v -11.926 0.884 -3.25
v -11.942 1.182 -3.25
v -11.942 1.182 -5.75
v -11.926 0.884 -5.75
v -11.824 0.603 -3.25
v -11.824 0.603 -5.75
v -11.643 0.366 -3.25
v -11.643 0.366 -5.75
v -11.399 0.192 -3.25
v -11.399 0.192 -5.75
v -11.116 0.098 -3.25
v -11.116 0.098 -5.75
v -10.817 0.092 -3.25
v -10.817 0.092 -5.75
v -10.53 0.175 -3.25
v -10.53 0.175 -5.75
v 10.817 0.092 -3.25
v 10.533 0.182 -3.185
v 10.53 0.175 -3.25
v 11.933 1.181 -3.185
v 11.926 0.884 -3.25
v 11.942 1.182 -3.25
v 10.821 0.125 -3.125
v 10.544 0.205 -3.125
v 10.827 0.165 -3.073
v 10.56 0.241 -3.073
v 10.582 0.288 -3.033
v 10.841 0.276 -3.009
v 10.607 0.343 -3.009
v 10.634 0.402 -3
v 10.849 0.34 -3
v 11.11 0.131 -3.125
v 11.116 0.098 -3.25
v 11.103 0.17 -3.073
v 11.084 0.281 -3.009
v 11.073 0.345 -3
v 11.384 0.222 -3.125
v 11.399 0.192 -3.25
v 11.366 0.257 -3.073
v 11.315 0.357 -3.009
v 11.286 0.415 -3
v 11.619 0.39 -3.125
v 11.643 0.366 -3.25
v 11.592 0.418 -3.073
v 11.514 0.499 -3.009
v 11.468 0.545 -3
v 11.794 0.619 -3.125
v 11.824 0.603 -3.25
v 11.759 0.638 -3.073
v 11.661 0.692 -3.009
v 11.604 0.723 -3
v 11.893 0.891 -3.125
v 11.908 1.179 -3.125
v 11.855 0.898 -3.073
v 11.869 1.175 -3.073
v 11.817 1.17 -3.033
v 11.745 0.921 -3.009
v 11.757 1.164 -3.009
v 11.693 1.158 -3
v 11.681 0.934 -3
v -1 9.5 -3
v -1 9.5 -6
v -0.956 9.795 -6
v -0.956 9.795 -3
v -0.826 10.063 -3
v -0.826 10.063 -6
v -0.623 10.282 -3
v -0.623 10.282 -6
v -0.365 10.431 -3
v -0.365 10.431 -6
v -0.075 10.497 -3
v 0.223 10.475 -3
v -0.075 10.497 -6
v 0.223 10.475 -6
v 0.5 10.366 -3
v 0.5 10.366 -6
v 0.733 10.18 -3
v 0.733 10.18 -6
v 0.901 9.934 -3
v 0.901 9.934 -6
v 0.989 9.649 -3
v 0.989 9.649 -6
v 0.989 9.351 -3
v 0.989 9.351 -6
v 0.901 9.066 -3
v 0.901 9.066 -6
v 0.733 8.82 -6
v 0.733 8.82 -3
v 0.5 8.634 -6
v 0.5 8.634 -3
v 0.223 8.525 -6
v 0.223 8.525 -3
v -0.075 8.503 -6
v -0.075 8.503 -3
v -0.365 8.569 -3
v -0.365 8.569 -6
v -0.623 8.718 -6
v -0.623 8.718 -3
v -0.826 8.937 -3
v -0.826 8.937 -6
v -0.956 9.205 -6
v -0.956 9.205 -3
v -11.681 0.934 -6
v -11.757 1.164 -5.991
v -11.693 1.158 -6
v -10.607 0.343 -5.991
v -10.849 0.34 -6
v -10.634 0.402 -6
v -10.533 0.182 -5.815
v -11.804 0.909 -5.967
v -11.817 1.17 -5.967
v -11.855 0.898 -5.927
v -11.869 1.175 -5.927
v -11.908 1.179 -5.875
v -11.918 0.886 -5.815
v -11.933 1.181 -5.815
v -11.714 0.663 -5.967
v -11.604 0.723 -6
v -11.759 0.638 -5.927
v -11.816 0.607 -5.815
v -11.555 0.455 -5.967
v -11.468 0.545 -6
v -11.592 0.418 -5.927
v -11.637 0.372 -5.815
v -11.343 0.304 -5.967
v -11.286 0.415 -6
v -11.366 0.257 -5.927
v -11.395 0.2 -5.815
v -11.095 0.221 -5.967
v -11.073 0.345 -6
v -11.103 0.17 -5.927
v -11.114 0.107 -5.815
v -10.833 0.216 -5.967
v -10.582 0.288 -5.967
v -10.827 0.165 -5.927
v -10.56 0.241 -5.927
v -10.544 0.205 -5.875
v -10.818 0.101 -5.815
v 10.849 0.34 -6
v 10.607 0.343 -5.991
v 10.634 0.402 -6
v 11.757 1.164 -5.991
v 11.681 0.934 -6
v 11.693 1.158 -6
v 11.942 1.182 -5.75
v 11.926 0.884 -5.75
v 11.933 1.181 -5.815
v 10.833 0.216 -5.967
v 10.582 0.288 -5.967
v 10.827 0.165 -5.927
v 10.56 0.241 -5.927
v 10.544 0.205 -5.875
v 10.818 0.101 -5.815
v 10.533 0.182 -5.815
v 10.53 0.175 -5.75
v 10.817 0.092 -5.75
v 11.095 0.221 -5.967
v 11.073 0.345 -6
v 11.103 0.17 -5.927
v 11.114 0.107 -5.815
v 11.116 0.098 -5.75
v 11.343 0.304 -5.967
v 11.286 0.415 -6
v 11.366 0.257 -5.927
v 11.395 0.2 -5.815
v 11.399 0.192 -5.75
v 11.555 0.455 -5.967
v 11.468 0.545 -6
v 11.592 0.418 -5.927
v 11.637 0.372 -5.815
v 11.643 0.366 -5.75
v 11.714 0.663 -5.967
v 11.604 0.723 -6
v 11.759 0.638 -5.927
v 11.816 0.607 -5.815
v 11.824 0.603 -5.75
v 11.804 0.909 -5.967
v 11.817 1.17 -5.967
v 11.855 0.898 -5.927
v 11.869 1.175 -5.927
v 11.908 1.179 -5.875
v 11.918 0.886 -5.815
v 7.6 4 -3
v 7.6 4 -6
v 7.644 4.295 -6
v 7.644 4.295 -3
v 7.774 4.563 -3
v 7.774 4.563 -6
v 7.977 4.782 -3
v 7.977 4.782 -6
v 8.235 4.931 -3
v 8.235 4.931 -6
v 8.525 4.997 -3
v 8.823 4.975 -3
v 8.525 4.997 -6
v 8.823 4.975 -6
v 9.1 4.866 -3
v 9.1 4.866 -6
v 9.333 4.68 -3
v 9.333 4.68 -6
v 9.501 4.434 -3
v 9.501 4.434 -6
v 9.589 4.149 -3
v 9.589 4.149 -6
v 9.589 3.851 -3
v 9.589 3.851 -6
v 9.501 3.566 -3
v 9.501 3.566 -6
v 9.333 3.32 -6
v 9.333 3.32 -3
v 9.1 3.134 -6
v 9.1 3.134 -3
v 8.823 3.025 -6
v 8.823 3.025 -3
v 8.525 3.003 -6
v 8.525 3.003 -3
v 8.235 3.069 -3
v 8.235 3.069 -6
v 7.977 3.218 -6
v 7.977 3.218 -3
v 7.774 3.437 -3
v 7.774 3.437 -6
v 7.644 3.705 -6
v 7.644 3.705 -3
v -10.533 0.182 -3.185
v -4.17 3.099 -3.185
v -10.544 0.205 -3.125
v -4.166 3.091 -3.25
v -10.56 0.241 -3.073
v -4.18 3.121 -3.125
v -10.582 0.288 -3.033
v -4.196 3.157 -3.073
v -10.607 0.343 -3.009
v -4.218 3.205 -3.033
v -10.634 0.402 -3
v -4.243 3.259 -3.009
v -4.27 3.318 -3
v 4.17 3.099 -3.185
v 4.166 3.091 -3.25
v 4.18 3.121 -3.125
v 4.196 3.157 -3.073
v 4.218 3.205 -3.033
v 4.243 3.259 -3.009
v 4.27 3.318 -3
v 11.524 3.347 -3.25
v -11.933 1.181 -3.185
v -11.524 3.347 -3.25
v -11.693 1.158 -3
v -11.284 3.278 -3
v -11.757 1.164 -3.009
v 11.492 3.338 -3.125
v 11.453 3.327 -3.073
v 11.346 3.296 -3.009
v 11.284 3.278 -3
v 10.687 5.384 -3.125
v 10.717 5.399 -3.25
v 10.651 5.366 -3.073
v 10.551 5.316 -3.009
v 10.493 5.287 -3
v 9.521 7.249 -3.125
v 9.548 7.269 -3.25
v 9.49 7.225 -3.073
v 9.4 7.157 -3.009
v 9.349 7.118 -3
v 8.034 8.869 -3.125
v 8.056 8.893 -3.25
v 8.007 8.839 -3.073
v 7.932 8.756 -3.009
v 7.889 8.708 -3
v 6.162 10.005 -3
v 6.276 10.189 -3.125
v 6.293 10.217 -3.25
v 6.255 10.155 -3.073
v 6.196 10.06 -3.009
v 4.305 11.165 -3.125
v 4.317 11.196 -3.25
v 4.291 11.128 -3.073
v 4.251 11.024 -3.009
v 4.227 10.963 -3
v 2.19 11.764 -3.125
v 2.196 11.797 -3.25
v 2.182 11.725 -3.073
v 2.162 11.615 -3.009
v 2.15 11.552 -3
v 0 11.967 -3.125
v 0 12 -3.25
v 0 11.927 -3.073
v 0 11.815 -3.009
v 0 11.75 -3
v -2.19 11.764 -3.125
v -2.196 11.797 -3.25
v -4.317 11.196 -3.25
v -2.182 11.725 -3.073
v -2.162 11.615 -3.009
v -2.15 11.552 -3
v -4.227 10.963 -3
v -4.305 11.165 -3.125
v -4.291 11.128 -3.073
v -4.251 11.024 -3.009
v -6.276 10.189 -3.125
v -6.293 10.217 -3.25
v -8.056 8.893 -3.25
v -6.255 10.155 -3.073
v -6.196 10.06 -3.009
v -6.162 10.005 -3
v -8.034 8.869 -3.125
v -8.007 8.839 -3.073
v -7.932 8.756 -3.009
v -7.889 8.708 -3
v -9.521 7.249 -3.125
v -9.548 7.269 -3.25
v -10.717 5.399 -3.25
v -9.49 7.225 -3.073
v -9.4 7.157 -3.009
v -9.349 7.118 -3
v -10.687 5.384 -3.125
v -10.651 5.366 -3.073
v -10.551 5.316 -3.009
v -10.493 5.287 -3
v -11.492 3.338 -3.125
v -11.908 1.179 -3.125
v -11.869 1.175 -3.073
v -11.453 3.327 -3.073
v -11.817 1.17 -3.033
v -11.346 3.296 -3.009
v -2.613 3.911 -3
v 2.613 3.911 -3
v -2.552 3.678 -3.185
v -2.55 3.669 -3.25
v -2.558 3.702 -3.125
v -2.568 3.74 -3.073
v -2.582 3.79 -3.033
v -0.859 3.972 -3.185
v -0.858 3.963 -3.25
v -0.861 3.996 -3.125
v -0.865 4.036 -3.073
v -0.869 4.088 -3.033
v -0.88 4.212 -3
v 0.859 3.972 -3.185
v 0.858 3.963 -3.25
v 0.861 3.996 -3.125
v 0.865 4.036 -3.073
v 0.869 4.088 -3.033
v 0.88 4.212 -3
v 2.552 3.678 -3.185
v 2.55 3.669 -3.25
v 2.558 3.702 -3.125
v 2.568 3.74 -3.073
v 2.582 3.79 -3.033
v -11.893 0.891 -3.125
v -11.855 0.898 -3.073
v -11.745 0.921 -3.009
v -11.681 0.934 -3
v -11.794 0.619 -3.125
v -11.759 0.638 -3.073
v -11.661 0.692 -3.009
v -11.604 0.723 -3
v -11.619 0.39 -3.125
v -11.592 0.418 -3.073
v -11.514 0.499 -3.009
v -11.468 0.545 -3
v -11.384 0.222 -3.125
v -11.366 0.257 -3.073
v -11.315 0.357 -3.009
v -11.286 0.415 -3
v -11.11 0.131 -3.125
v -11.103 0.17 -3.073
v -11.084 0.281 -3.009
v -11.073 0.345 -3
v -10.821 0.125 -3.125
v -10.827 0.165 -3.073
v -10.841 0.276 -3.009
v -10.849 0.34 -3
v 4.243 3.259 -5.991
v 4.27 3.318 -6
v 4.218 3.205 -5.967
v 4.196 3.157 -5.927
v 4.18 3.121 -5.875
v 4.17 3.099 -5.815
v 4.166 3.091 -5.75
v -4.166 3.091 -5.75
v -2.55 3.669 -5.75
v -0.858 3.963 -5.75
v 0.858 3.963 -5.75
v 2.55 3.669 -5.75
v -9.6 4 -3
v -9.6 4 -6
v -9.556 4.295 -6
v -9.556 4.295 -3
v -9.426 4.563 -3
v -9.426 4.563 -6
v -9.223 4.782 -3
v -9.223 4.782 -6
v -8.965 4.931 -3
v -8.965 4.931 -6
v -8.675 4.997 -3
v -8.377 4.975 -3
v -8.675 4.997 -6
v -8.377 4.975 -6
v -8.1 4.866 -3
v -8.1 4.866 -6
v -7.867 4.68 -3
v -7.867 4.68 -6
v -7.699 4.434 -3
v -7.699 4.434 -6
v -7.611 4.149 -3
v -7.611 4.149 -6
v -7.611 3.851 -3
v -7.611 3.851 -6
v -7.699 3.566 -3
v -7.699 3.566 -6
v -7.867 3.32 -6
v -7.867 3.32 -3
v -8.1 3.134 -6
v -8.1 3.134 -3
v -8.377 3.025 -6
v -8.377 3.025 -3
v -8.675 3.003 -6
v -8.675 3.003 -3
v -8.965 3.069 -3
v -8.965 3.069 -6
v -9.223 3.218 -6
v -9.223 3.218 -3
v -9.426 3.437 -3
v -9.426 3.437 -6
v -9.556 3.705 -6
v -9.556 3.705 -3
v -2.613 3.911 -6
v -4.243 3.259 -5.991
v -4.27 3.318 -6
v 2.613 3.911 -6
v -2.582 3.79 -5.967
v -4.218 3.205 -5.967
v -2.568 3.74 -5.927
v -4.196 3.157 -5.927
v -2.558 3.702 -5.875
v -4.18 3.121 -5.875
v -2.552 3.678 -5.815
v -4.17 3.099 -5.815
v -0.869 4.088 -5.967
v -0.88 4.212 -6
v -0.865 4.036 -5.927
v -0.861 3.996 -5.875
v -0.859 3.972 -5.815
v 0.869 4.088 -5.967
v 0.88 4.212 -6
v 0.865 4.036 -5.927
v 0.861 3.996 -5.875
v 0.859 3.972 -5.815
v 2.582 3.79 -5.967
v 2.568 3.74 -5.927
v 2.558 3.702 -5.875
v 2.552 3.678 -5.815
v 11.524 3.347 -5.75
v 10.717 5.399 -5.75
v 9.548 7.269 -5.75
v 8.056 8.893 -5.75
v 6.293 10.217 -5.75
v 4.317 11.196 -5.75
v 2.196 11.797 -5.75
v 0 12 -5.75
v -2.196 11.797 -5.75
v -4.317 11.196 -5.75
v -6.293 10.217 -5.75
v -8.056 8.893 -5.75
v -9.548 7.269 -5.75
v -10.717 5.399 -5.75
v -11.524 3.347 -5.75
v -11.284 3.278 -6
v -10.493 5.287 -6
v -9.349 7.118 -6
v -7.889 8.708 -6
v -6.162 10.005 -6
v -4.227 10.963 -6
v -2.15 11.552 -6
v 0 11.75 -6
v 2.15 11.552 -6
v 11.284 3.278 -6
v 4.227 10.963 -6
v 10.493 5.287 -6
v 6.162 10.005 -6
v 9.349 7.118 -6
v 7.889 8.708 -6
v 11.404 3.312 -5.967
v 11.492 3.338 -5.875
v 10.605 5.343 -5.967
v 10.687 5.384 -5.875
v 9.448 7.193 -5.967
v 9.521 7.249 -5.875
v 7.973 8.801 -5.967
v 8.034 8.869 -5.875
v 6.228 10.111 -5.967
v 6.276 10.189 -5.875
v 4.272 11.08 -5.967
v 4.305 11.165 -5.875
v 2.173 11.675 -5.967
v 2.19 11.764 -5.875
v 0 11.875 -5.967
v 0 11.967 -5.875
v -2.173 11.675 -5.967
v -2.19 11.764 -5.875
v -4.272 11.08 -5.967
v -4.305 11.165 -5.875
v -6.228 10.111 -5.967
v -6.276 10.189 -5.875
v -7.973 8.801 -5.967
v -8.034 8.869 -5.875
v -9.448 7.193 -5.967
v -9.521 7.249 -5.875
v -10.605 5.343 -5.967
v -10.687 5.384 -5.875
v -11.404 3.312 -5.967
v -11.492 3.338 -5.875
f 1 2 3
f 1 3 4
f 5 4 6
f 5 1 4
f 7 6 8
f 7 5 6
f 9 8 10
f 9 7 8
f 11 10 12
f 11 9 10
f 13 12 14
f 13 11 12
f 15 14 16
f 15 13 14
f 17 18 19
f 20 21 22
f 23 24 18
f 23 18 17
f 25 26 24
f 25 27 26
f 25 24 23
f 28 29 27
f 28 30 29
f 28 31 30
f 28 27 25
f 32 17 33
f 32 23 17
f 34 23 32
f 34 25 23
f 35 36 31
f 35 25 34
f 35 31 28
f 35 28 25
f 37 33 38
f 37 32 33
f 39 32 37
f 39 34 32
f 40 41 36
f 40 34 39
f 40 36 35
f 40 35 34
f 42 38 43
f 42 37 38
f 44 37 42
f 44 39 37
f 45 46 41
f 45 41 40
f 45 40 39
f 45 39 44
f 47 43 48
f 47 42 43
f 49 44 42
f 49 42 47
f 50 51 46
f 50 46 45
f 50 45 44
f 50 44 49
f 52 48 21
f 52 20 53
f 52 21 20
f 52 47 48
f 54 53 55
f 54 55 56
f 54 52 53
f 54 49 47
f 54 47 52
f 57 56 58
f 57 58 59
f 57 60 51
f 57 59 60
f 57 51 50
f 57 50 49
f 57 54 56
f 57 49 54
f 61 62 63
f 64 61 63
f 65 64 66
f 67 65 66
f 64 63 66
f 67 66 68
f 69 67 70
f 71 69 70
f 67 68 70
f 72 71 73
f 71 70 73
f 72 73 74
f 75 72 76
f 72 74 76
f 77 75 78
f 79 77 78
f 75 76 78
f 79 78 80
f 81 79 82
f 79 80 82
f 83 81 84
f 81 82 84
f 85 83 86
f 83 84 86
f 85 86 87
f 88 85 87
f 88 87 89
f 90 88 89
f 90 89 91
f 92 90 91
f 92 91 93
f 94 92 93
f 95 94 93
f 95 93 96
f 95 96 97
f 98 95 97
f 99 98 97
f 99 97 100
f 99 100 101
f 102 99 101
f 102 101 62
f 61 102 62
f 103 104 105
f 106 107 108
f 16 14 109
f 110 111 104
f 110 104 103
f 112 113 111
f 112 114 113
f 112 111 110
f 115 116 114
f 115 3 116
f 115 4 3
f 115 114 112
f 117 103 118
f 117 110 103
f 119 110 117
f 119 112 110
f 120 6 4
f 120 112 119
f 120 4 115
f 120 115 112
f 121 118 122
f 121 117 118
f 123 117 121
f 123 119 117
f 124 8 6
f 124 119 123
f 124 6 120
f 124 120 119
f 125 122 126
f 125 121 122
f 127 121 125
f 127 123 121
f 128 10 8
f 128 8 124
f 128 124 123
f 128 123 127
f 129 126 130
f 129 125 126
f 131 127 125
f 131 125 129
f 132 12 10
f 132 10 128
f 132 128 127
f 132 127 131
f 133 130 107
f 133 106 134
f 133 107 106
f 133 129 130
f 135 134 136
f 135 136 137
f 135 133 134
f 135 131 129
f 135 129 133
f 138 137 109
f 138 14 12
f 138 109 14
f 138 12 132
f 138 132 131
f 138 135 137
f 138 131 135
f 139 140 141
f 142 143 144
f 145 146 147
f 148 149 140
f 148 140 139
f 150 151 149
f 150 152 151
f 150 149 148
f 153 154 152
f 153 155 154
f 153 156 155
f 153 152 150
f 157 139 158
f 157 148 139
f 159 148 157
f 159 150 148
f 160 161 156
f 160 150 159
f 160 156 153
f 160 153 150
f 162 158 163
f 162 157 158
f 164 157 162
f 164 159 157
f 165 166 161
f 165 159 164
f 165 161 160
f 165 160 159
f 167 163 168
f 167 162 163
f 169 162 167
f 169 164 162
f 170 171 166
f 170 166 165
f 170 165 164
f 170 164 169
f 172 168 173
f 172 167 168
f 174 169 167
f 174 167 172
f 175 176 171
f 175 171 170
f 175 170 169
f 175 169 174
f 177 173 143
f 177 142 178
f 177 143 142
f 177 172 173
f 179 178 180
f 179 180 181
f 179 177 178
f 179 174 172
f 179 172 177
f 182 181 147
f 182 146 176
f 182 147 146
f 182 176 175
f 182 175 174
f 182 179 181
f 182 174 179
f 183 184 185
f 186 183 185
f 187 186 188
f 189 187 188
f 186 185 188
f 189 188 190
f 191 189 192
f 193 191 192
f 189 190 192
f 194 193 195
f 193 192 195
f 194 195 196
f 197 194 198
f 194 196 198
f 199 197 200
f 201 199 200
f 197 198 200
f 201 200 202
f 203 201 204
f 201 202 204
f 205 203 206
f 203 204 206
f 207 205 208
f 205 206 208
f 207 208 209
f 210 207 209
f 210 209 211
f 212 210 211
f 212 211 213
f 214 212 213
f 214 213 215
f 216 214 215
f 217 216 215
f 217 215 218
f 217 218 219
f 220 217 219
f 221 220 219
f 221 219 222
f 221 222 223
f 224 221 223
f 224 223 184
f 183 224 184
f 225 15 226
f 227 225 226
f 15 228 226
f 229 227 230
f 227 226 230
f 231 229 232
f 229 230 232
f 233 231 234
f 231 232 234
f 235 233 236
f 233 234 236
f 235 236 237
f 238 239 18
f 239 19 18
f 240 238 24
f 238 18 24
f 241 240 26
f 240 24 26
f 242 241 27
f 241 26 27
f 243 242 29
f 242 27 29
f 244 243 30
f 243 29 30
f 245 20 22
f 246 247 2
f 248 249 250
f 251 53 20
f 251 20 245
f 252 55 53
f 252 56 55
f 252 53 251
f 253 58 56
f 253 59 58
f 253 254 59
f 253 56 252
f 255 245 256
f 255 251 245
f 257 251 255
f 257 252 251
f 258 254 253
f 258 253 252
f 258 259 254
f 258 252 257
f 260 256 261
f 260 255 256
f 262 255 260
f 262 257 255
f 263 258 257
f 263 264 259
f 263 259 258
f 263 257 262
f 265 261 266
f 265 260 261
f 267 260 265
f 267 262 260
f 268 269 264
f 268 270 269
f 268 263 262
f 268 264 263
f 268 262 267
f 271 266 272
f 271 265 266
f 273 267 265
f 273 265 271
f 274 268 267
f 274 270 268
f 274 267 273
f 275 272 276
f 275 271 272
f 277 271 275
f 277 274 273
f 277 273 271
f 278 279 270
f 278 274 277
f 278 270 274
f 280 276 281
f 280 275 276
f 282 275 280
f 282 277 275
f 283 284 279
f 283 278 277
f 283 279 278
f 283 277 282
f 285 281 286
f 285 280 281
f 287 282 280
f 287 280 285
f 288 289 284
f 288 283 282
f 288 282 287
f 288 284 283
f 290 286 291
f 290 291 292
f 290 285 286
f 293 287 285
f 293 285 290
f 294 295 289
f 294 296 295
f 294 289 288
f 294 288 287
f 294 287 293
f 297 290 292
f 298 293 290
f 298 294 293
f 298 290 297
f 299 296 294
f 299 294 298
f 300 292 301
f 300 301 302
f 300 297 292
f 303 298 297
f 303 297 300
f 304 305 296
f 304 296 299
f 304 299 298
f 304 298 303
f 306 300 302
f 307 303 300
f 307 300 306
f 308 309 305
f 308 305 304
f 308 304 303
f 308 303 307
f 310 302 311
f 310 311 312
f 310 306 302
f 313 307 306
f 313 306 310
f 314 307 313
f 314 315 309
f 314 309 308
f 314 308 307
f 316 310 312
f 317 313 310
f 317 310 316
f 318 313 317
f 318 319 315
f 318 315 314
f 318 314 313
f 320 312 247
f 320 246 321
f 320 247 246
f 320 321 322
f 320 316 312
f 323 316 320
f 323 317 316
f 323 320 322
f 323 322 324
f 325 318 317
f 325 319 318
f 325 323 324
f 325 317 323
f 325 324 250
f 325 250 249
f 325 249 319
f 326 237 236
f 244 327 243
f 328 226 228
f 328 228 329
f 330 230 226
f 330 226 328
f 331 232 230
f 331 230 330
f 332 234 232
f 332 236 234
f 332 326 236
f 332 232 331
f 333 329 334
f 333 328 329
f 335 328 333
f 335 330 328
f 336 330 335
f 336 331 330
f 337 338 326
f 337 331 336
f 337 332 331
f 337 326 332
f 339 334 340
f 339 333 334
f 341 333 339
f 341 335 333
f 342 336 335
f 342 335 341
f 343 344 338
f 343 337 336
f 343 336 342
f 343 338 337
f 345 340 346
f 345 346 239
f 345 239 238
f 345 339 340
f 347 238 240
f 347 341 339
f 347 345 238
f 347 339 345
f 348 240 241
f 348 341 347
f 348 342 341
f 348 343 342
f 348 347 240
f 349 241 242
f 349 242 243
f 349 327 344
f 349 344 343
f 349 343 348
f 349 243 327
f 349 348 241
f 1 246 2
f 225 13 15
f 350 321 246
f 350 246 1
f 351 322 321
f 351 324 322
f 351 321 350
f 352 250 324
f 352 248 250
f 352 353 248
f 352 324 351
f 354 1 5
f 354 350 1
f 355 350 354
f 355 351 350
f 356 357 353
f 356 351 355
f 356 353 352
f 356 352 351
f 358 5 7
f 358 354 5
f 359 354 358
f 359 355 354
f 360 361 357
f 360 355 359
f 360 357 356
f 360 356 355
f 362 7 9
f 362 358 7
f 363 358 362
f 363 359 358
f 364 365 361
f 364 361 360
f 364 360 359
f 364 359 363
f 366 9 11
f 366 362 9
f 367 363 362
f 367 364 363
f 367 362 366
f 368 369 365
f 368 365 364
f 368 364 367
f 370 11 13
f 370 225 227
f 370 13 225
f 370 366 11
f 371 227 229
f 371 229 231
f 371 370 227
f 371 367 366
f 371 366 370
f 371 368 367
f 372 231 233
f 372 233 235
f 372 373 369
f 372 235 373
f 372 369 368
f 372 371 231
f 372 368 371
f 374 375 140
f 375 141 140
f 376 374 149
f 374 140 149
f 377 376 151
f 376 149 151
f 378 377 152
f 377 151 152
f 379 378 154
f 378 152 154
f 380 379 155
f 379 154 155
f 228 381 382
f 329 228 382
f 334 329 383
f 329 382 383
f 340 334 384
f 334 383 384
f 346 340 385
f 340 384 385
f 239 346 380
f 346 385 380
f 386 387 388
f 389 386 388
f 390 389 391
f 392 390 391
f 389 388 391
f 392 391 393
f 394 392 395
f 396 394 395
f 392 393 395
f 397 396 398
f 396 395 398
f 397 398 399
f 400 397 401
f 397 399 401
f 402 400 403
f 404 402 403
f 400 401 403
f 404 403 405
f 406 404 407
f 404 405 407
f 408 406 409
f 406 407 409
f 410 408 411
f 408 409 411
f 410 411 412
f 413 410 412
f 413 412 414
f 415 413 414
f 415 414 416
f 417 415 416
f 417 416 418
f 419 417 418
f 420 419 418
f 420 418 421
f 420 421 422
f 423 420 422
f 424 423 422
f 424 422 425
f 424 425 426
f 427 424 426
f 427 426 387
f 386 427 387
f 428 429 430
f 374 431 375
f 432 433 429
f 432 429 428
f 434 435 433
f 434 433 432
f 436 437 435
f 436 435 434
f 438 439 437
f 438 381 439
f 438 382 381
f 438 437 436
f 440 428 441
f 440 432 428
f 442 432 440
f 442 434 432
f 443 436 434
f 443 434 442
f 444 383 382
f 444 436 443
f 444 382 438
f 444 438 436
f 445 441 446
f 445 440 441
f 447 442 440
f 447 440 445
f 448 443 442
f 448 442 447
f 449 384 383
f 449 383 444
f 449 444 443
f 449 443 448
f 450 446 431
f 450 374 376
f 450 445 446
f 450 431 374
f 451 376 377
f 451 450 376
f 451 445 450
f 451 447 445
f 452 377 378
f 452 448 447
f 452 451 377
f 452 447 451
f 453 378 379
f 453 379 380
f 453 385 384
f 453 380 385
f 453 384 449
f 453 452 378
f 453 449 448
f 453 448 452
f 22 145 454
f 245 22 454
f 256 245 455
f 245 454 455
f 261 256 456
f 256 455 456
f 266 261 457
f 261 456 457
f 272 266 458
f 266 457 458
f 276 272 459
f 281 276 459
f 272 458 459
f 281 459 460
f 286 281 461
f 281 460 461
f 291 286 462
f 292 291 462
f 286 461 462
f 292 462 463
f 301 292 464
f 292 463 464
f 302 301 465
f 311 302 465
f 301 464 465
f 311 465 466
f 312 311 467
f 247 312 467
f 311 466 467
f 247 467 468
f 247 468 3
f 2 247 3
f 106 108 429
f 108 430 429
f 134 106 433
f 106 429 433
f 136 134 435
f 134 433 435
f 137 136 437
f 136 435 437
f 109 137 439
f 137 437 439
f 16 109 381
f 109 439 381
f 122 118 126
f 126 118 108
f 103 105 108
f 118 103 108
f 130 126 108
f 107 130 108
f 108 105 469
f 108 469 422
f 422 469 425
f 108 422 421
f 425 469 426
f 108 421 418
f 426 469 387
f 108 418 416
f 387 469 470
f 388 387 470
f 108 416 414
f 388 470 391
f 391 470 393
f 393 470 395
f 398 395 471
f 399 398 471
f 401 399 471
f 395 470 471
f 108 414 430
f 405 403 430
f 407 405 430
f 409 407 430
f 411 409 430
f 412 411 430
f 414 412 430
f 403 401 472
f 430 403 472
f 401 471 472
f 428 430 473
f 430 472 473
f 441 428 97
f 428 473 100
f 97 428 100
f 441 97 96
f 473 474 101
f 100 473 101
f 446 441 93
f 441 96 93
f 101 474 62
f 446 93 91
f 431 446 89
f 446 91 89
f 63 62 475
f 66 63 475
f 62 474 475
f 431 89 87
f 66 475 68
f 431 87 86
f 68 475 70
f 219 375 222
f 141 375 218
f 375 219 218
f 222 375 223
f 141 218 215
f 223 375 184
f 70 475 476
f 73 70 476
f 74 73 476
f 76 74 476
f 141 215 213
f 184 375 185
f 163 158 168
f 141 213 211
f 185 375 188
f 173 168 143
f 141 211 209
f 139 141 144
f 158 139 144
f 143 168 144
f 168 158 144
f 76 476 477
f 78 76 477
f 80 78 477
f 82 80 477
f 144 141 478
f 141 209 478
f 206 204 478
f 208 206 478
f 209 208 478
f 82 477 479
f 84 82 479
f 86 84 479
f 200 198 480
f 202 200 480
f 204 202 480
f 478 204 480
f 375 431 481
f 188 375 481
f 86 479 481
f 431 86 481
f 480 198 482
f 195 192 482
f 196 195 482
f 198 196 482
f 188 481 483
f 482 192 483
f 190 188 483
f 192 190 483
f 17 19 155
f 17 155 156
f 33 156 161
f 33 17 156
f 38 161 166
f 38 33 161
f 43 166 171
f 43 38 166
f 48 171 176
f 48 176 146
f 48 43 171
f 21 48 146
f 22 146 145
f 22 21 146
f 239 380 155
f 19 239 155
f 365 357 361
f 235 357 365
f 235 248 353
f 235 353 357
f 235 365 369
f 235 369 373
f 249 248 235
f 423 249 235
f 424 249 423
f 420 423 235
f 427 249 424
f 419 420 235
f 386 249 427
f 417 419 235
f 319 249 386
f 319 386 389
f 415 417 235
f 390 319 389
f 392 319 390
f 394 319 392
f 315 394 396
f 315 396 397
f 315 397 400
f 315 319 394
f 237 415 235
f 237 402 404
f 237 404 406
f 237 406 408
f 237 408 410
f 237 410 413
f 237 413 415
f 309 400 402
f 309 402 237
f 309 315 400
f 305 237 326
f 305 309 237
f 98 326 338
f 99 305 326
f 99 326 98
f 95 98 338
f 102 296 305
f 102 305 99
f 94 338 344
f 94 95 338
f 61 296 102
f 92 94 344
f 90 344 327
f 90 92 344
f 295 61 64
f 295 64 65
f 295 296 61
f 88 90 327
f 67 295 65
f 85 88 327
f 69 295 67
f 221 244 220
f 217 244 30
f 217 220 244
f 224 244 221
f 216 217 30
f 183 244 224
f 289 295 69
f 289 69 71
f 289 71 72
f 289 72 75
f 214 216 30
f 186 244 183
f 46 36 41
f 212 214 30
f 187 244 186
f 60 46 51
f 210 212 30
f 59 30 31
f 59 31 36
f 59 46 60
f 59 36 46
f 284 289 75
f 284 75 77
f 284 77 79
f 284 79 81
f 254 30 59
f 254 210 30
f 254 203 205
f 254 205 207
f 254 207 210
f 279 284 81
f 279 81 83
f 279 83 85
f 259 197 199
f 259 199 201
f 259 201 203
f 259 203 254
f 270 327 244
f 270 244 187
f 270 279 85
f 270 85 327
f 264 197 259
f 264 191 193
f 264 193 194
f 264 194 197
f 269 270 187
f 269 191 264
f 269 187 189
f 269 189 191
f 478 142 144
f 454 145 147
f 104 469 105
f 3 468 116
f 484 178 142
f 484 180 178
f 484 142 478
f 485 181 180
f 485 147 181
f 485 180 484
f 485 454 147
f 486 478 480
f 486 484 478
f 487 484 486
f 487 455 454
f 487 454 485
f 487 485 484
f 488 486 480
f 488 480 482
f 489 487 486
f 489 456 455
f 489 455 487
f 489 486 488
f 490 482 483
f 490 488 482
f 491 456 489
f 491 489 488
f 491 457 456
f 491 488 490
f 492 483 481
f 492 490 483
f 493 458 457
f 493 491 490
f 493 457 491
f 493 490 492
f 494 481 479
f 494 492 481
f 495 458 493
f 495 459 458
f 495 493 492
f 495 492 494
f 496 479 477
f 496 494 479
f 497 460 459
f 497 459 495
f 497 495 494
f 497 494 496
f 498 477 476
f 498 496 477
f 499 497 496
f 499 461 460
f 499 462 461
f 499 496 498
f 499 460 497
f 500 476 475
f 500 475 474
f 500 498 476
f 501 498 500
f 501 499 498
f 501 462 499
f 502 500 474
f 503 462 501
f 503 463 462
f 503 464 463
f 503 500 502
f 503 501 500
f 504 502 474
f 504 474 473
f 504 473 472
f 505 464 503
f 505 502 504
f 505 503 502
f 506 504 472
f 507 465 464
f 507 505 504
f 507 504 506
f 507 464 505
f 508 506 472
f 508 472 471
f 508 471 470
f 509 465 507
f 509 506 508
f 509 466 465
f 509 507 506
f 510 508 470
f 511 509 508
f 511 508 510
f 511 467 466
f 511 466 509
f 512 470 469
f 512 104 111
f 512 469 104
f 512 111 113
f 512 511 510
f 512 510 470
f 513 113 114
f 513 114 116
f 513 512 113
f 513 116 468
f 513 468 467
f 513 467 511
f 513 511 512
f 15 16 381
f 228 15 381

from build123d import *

# Parameters (mm, degrees)
BOSS_EXTRUDE2_DEPTH = 3
FILLET2_R           = 1
FILLET3_R           = 0.25
SKETCH4_R           = 1
CUT_EXTRUDE1_DEPTH  = 10


with BuildPart() as part:
    # Sketch3 → Boss-Extrude2 (new body)
    with BuildSketch(Plane.XY.offset(-6)):
        with BuildLine():
            Line((4.165977905, 3.090909091), (11.989810158, -0.494421262))
            ThreePointArc((11.989810158, -0.494421262), (0, 12), (-11.989810158, -0.494421262))
            Line((-11.989810158, -0.494421262), (-4.165977905, 3.090909091))
            ThreePointArc((-4.165977905, 3.090909091), (0, 4), (4.165977905, 3.090909091))
        make_face()
    extrude(amount=BOSS_EXTRUDE2_DEPTH)

    # Fillet2
    fillet2_edges = [part.edges().sort_by_distance(p)[0] for p in [
        (11.989810158, -0.494421262, -4.5),
        (-11.989810158, -0.494421262, -4.5),
    ]]
    fillet(fillet2_edges, radius=FILLET2_R)

    # Fillet3
    fillet3_edges = [part.edges().sort_by_distance(p)[0] for p in [
        (0, 4, -3),
        (7.347934502, 1.632753394, -3),
        (-7.347934502, 1.632753394, -6),
        (-7.347934502, 1.632753394, -3),
        (0, 12, -6),
        (11.527432024, 0.26974446, -6),
        (-11.527432024, 0.26974446, -6),
        (0, 12, -3),
        (11.527432024, 0.26974446, -3),
        (-11.527432024, 0.26974446, -3),
        (7.347934502, 1.632753394, -6),
        (0, 4, -6),
    ]]
    fillet(fillet3_edges, radius=FILLET3_R)

    # Sketch4 → Cut-Extrude1 (cut)
    with BuildSketch(Plane(origin=(0, 0, -6), x_dir=(-1, 0, 0), z_dir=(0, 0, -1))):
        with Locations((0, 9.5)):
            Circle(SKETCH4_R)
        with Locations((8.6, 4)):
            Circle(SKETCH4_R)
        with Locations((-8.6, 4)):
            Circle(SKETCH4_R)
    extrude(amount=-CUT_EXTRUDE1_DEPTH, mode=Mode.SUBTRACT)


solid = part.part
